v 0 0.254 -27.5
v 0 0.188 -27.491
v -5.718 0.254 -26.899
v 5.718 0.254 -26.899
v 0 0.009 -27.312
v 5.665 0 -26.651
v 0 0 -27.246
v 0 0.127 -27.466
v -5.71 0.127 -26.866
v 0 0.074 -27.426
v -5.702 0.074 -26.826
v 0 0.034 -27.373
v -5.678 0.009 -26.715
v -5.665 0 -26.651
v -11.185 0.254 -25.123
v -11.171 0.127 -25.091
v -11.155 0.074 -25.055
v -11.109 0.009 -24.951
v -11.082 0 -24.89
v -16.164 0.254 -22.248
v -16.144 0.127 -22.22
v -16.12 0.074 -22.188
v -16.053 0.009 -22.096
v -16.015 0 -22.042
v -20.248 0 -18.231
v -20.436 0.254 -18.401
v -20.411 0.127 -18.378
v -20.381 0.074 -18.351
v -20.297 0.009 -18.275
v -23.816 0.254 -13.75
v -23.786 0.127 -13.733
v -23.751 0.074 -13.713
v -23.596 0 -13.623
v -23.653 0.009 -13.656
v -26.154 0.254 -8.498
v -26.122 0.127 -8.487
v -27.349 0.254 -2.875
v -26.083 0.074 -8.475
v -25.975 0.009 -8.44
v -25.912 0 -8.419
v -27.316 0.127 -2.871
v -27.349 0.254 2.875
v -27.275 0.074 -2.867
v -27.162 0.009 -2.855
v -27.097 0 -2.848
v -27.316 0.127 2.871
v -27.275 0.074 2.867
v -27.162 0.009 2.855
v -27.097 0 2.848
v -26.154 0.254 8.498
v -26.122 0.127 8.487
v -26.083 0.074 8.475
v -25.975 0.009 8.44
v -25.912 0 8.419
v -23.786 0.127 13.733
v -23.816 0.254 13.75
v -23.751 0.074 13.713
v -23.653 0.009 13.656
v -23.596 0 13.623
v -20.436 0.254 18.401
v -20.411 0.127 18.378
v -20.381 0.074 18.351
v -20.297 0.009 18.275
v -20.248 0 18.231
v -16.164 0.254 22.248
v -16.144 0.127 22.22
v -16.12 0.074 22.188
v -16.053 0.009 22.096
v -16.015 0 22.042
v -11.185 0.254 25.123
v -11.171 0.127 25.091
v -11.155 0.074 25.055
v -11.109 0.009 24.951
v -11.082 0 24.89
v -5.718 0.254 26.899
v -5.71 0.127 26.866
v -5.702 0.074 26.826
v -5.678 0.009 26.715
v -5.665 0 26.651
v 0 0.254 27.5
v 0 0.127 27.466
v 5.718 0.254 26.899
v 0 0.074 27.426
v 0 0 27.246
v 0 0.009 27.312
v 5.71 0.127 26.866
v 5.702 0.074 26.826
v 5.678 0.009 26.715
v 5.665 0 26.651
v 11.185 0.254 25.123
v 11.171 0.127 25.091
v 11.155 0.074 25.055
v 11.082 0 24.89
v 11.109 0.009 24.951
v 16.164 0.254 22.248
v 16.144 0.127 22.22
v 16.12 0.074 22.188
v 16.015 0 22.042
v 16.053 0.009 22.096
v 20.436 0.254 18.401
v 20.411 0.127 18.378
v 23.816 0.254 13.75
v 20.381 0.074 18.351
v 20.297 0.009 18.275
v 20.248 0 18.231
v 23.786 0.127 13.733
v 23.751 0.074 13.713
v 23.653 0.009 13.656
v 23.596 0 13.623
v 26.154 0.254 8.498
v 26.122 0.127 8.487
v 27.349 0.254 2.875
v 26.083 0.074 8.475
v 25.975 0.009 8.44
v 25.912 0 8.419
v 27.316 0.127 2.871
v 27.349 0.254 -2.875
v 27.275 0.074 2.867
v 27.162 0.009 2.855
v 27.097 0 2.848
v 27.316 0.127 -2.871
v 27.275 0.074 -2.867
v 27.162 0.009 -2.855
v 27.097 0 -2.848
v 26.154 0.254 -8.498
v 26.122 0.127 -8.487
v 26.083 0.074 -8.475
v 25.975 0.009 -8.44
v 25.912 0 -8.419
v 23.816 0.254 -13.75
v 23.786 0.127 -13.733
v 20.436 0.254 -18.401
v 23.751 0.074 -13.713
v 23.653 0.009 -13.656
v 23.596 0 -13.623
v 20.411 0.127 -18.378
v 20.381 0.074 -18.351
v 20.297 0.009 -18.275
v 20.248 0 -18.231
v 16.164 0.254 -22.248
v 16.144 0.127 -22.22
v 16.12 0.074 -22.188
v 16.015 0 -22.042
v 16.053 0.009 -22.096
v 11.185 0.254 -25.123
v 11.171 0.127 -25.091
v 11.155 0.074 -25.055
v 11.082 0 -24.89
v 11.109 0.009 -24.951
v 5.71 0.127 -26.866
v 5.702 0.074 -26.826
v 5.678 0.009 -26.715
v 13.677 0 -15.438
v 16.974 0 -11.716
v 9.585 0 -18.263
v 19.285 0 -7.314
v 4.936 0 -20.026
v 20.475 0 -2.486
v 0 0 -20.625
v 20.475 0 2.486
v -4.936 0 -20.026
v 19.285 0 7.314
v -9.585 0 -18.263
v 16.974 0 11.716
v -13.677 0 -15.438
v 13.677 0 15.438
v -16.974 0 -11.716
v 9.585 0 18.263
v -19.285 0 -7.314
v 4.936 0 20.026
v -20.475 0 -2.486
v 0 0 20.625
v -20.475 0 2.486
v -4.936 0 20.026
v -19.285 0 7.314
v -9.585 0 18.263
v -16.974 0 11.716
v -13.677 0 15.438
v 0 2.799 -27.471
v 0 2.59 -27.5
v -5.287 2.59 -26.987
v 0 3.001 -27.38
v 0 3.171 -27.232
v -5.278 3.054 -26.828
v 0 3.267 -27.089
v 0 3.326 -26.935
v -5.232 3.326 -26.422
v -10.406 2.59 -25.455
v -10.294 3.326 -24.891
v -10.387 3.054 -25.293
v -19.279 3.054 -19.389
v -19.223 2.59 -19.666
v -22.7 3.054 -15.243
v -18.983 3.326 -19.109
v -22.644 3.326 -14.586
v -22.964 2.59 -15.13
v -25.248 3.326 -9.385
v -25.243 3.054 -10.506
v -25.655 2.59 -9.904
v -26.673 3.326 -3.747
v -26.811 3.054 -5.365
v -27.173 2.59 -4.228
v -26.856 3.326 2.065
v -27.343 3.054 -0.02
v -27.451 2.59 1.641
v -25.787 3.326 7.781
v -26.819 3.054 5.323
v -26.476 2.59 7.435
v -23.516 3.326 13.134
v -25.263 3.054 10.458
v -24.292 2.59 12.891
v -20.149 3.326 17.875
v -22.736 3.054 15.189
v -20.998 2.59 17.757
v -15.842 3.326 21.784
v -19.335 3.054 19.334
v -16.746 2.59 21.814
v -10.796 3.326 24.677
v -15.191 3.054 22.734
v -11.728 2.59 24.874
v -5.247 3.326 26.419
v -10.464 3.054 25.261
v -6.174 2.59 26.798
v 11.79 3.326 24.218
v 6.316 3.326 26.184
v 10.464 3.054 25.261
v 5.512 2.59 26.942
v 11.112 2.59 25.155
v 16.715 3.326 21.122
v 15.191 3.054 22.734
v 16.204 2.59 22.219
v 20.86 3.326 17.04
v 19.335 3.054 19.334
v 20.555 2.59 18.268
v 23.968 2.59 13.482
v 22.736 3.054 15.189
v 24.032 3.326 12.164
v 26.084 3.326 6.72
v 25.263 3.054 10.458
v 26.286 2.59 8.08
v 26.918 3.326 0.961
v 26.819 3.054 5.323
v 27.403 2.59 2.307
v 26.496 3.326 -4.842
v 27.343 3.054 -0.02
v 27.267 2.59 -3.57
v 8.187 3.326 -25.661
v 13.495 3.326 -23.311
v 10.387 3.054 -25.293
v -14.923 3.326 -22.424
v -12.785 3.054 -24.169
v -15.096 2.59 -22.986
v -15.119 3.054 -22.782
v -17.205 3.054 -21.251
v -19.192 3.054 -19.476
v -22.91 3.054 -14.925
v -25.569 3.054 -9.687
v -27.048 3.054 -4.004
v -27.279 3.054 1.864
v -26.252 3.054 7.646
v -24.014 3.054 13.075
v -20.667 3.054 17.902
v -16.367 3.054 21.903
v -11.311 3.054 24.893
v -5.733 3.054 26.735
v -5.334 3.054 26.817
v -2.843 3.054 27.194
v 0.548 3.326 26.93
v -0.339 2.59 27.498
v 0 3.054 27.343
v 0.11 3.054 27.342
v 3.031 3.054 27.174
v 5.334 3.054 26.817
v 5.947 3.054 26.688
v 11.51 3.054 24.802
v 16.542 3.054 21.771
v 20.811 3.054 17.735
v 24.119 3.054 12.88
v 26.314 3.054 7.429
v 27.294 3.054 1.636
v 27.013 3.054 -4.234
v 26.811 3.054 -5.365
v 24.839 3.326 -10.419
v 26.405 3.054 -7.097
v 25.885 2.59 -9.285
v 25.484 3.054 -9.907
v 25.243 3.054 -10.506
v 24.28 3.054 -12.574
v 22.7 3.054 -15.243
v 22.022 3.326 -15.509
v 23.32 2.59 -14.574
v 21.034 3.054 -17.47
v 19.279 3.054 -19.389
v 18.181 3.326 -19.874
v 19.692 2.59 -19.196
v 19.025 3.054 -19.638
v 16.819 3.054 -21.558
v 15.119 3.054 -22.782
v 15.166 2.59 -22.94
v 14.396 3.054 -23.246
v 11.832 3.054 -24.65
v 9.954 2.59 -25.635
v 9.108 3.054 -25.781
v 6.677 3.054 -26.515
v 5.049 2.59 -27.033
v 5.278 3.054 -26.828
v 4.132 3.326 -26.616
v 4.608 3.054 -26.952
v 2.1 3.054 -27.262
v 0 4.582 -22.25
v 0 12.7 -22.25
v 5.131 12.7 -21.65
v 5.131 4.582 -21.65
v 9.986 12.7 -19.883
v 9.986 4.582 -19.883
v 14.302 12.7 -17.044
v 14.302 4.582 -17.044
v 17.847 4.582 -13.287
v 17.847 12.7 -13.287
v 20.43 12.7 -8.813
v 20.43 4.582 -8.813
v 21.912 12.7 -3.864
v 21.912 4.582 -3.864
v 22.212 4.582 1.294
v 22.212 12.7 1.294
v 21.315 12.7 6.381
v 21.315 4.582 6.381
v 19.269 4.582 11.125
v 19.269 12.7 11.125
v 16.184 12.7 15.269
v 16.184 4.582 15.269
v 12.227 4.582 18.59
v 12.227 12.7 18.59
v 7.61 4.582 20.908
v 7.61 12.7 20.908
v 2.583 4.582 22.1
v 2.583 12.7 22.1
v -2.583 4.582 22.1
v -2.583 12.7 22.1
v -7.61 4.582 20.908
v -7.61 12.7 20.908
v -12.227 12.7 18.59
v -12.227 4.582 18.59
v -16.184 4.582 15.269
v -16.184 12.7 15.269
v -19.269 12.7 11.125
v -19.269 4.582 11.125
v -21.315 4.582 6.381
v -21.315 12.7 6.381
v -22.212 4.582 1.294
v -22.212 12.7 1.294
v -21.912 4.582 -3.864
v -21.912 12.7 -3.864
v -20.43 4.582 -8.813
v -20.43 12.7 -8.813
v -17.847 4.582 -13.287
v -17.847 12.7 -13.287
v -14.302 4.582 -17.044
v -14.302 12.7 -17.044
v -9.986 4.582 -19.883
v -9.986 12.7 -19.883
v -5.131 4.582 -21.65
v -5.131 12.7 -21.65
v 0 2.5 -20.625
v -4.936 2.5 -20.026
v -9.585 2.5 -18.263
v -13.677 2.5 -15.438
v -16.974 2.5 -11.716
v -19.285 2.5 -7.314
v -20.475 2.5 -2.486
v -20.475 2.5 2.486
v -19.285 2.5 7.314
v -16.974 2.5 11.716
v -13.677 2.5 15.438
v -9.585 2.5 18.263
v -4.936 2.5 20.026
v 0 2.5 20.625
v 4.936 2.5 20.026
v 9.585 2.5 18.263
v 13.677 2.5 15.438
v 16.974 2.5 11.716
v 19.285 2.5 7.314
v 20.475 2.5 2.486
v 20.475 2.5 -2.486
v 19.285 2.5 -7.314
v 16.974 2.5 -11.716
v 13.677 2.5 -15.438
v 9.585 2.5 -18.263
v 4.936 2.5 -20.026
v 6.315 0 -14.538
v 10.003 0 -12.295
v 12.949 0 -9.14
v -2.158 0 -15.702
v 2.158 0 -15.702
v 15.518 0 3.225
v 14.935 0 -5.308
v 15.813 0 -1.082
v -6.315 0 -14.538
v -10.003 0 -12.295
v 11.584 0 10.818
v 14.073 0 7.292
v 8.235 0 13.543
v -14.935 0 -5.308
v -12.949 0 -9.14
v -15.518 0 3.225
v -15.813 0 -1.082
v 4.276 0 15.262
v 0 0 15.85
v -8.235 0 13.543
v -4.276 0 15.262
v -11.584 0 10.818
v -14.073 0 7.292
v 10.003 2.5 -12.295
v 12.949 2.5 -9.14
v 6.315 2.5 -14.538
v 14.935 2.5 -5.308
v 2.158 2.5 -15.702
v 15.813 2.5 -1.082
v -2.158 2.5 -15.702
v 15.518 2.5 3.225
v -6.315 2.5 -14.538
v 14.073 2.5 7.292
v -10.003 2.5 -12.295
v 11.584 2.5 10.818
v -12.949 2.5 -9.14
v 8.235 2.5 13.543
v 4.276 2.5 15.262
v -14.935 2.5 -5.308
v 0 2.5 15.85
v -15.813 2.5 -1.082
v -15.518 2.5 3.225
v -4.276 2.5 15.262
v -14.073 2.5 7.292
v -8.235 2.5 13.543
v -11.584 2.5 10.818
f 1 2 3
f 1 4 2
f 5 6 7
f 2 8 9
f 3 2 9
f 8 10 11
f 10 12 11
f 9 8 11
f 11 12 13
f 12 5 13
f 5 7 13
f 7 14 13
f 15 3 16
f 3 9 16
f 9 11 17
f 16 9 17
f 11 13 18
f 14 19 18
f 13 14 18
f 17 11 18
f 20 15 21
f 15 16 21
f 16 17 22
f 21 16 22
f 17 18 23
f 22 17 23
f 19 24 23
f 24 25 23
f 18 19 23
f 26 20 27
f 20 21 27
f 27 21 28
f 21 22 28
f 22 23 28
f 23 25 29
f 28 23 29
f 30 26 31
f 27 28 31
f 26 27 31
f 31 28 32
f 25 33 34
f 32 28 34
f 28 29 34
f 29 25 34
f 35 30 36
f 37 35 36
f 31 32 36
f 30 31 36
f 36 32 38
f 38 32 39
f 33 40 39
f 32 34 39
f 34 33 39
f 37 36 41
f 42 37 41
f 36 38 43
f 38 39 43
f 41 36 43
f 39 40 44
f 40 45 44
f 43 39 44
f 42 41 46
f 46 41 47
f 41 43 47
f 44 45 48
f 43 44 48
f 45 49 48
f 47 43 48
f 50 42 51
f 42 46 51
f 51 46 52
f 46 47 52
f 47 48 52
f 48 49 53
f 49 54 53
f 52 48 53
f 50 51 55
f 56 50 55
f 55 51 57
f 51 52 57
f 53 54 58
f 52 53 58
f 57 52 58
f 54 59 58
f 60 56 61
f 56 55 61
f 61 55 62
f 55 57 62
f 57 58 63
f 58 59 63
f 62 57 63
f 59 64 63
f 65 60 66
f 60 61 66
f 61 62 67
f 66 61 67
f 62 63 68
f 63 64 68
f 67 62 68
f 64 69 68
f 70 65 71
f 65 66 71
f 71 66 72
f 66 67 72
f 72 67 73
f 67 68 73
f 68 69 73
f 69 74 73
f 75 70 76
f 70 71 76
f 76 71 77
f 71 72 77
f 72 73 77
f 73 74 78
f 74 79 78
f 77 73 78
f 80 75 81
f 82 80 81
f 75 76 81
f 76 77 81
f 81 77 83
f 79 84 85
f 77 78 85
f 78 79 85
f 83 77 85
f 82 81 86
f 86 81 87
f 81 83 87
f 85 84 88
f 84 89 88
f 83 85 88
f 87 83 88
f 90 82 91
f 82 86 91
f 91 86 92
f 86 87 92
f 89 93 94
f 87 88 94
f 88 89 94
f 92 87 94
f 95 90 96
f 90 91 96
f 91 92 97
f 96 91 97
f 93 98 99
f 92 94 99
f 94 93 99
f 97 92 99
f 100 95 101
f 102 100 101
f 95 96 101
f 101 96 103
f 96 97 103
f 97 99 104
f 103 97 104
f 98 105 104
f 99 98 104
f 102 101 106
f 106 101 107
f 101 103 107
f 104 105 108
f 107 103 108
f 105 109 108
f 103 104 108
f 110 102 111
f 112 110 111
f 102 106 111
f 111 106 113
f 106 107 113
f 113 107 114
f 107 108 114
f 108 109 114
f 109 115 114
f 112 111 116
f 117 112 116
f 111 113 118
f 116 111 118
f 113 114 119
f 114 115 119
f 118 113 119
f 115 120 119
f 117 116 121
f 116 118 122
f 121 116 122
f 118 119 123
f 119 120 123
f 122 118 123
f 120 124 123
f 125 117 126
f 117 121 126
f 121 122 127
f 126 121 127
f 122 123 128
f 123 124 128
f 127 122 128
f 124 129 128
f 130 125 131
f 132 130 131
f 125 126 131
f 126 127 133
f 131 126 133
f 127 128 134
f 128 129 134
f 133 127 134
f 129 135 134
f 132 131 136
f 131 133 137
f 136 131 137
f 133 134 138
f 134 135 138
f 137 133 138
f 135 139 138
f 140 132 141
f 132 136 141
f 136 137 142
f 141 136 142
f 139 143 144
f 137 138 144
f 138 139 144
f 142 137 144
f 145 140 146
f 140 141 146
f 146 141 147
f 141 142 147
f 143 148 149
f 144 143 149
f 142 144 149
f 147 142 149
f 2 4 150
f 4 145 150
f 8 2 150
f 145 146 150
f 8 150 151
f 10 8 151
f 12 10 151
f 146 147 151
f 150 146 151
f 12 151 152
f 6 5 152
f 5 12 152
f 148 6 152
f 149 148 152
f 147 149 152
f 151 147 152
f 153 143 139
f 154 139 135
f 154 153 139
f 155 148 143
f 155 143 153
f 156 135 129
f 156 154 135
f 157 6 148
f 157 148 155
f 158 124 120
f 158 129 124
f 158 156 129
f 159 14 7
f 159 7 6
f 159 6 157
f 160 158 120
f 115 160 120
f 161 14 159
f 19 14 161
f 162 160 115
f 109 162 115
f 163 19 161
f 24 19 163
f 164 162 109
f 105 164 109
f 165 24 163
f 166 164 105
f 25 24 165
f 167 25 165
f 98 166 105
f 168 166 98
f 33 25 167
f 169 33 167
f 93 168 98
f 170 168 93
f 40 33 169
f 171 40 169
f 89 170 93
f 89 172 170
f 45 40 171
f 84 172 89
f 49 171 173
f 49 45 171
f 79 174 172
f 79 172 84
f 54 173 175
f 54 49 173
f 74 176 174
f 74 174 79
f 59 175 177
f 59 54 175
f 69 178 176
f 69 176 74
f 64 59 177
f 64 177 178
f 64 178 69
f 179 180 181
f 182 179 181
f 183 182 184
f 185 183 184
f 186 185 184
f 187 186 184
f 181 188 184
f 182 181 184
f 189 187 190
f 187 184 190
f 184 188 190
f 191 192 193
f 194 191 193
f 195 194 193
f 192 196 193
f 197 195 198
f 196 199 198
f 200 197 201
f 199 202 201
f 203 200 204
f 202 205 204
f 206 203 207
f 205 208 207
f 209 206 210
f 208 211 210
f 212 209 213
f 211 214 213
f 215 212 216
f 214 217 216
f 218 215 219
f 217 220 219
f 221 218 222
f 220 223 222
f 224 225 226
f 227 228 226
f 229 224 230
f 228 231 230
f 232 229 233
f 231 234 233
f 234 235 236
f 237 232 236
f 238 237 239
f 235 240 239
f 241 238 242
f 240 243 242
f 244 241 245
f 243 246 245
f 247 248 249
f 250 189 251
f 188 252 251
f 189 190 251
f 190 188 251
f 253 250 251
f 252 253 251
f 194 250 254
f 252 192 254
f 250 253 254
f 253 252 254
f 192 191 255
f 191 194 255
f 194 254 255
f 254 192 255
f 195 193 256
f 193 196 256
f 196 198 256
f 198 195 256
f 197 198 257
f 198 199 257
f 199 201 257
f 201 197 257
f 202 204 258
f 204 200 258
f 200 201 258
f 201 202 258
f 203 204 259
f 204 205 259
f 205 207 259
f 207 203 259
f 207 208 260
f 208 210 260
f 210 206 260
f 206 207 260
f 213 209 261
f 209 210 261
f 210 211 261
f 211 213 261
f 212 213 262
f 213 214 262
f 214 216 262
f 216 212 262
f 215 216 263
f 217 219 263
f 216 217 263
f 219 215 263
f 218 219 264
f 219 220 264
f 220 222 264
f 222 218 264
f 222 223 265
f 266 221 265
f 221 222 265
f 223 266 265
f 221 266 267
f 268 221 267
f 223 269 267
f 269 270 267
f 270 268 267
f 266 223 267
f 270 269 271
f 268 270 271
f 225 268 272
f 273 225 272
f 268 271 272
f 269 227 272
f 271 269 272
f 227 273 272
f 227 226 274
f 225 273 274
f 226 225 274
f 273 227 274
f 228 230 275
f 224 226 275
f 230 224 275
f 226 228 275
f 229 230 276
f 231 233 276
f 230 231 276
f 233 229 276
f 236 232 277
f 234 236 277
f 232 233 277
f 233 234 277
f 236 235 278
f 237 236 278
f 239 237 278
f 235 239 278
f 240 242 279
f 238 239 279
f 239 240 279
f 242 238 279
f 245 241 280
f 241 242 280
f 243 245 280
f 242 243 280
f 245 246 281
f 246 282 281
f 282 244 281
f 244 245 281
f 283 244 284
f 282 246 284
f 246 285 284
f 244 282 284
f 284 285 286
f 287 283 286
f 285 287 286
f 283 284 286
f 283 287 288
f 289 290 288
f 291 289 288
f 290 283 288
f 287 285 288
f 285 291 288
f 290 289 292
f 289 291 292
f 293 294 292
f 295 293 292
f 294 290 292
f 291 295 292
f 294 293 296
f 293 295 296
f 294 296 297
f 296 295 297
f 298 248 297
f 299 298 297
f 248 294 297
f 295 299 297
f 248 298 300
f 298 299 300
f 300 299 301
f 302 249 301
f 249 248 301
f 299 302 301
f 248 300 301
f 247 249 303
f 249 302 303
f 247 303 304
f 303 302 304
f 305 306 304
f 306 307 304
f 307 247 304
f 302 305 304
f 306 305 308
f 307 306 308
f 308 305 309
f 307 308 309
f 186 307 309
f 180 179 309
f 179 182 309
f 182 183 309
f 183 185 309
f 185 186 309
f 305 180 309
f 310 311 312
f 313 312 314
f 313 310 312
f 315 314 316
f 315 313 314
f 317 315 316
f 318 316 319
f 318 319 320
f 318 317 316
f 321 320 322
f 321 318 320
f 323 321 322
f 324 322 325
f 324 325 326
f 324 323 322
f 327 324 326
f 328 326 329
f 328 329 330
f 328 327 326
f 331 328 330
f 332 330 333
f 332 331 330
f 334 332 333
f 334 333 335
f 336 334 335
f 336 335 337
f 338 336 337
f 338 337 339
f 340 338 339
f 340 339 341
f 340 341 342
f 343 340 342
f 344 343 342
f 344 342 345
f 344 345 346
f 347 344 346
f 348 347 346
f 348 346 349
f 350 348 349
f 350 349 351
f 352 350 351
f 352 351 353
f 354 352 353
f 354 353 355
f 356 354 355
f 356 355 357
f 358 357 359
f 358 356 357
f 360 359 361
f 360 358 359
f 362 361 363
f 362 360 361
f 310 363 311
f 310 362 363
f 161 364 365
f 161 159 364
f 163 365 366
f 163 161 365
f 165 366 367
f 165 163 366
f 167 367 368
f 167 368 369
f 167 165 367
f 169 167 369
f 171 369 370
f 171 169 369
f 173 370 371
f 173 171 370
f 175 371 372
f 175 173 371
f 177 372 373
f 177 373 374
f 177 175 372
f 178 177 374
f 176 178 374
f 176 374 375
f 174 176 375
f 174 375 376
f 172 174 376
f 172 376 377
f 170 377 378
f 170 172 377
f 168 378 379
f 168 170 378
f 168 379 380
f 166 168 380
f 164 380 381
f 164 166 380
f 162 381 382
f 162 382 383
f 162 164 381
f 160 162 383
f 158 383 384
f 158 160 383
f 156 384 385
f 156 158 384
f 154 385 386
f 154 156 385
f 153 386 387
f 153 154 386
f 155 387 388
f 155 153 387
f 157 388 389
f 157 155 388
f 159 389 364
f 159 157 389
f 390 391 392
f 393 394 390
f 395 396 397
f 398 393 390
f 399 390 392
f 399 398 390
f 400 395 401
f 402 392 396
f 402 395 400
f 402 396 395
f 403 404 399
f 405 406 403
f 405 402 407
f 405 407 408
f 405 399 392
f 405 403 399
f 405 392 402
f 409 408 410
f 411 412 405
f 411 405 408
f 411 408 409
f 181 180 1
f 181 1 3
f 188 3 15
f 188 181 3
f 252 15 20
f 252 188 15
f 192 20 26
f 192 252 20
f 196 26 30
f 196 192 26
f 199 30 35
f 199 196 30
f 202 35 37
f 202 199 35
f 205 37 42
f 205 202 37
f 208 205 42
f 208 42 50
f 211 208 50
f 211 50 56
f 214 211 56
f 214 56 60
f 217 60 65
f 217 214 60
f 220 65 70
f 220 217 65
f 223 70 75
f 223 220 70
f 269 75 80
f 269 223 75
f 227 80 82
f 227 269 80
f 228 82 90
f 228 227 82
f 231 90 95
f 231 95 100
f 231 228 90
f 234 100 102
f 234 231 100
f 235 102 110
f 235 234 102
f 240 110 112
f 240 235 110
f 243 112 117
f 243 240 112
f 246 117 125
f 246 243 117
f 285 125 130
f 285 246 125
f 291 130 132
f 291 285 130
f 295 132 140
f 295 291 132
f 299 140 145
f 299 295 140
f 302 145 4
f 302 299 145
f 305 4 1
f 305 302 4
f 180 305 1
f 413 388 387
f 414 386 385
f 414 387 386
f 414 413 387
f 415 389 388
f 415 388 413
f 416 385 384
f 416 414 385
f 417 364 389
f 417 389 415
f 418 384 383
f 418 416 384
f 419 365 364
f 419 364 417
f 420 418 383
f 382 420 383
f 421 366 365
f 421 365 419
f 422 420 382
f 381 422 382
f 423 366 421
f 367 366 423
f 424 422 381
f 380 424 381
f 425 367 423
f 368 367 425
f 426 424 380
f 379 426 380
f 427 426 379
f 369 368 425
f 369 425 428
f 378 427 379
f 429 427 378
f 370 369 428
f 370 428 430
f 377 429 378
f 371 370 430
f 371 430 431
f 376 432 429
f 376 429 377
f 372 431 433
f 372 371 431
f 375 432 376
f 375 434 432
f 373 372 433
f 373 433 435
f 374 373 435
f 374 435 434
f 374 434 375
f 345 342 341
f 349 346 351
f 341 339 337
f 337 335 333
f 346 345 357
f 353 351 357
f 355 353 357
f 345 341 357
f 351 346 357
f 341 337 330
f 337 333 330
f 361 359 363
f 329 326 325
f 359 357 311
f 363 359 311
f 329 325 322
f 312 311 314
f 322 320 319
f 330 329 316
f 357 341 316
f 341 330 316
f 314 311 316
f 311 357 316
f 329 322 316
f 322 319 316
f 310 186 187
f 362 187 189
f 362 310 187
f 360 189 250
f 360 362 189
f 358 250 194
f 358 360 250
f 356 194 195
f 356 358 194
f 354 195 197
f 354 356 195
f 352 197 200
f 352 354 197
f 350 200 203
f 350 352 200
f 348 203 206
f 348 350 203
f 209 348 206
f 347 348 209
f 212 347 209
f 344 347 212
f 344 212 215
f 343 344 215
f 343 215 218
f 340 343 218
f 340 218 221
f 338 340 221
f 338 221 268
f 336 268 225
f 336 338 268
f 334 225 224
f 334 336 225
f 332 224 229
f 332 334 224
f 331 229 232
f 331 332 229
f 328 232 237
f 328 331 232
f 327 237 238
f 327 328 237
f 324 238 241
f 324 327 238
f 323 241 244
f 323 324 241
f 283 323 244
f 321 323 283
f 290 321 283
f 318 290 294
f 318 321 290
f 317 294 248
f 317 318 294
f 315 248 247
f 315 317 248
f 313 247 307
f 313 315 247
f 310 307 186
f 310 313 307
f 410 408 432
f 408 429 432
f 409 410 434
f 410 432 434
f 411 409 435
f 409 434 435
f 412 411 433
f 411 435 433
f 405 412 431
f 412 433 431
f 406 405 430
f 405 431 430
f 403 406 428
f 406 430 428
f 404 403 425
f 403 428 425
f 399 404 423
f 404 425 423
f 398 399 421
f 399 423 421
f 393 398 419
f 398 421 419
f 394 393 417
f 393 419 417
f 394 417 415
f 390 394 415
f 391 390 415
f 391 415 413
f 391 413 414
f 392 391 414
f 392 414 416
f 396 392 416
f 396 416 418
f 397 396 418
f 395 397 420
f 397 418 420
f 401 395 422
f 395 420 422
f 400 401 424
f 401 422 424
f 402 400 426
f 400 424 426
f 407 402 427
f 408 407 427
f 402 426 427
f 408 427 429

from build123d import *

# Parameters (mm, degrees)
SKETCH2_W  = 15.85
SKETCH2_H  = 2.5
SKETCH5_R  = 22.25
STUB_DEPTH = 10.2
FILLET1_R  = 0.762
FILLET2_R  = 0.254


with BuildPart() as part:
    # Sketch1 → Flange (revolve)
    with BuildSketch(Plane(origin=(0, 0, 0), x_dir=(0, 0, -1), z_dir=(1, 0, 0)), mode=Mode.PRIVATE) as flange_sk:
        Polygon((-27.5, 0), (-27.5, 3.175), (-20.315802195, 5.1), (0, 5.1), (0, 2.5), (-20.625, 2.5), (-20.625, 0), align=None)
    revolve(flange_sk.sketch.rotate(Axis((0, 0, 0), (0, 1, 0)), 180), axis=Axis((0, 0, 0), (0, 1, 0)))

    # Sketch2 → Blank Insert (revolve)
    with BuildSketch(Plane(origin=(0, 0, 0), x_dir=(0, 0, -1), z_dir=(1, 0, 0))):
        with Locations((-7.925, 1.25)):
            Rectangle(SKETCH2_W, SKETCH2_H)
    revolve(axis=Axis((0, 0, 0), (0, -1, 0)))

    # Sketch5 → Stub (add)
    with BuildSketch(Plane.XZ.offset(-2.5)):
        with Locations(Location((0, 0, 0), (0, 0, 270))):
            Circle(SKETCH5_R)
    extrude(amount=-STUB_DEPTH)

    # Fillet1
    fillet1_edges = [part.edges().sort_by_distance(p)[0] for p in [
        (0, 3.175, 27.5),
    ]]
    fillet(fillet1_edges, radius=FILLET1_R)

    # Fillet2
    fillet2_edges = [part.edges().sort_by_distance(p)[0] for p in [
        (0, 0, 27.5),
    ]]
    fillet(fillet2_edges, radius=FILLET2_R)


solid = part.part
